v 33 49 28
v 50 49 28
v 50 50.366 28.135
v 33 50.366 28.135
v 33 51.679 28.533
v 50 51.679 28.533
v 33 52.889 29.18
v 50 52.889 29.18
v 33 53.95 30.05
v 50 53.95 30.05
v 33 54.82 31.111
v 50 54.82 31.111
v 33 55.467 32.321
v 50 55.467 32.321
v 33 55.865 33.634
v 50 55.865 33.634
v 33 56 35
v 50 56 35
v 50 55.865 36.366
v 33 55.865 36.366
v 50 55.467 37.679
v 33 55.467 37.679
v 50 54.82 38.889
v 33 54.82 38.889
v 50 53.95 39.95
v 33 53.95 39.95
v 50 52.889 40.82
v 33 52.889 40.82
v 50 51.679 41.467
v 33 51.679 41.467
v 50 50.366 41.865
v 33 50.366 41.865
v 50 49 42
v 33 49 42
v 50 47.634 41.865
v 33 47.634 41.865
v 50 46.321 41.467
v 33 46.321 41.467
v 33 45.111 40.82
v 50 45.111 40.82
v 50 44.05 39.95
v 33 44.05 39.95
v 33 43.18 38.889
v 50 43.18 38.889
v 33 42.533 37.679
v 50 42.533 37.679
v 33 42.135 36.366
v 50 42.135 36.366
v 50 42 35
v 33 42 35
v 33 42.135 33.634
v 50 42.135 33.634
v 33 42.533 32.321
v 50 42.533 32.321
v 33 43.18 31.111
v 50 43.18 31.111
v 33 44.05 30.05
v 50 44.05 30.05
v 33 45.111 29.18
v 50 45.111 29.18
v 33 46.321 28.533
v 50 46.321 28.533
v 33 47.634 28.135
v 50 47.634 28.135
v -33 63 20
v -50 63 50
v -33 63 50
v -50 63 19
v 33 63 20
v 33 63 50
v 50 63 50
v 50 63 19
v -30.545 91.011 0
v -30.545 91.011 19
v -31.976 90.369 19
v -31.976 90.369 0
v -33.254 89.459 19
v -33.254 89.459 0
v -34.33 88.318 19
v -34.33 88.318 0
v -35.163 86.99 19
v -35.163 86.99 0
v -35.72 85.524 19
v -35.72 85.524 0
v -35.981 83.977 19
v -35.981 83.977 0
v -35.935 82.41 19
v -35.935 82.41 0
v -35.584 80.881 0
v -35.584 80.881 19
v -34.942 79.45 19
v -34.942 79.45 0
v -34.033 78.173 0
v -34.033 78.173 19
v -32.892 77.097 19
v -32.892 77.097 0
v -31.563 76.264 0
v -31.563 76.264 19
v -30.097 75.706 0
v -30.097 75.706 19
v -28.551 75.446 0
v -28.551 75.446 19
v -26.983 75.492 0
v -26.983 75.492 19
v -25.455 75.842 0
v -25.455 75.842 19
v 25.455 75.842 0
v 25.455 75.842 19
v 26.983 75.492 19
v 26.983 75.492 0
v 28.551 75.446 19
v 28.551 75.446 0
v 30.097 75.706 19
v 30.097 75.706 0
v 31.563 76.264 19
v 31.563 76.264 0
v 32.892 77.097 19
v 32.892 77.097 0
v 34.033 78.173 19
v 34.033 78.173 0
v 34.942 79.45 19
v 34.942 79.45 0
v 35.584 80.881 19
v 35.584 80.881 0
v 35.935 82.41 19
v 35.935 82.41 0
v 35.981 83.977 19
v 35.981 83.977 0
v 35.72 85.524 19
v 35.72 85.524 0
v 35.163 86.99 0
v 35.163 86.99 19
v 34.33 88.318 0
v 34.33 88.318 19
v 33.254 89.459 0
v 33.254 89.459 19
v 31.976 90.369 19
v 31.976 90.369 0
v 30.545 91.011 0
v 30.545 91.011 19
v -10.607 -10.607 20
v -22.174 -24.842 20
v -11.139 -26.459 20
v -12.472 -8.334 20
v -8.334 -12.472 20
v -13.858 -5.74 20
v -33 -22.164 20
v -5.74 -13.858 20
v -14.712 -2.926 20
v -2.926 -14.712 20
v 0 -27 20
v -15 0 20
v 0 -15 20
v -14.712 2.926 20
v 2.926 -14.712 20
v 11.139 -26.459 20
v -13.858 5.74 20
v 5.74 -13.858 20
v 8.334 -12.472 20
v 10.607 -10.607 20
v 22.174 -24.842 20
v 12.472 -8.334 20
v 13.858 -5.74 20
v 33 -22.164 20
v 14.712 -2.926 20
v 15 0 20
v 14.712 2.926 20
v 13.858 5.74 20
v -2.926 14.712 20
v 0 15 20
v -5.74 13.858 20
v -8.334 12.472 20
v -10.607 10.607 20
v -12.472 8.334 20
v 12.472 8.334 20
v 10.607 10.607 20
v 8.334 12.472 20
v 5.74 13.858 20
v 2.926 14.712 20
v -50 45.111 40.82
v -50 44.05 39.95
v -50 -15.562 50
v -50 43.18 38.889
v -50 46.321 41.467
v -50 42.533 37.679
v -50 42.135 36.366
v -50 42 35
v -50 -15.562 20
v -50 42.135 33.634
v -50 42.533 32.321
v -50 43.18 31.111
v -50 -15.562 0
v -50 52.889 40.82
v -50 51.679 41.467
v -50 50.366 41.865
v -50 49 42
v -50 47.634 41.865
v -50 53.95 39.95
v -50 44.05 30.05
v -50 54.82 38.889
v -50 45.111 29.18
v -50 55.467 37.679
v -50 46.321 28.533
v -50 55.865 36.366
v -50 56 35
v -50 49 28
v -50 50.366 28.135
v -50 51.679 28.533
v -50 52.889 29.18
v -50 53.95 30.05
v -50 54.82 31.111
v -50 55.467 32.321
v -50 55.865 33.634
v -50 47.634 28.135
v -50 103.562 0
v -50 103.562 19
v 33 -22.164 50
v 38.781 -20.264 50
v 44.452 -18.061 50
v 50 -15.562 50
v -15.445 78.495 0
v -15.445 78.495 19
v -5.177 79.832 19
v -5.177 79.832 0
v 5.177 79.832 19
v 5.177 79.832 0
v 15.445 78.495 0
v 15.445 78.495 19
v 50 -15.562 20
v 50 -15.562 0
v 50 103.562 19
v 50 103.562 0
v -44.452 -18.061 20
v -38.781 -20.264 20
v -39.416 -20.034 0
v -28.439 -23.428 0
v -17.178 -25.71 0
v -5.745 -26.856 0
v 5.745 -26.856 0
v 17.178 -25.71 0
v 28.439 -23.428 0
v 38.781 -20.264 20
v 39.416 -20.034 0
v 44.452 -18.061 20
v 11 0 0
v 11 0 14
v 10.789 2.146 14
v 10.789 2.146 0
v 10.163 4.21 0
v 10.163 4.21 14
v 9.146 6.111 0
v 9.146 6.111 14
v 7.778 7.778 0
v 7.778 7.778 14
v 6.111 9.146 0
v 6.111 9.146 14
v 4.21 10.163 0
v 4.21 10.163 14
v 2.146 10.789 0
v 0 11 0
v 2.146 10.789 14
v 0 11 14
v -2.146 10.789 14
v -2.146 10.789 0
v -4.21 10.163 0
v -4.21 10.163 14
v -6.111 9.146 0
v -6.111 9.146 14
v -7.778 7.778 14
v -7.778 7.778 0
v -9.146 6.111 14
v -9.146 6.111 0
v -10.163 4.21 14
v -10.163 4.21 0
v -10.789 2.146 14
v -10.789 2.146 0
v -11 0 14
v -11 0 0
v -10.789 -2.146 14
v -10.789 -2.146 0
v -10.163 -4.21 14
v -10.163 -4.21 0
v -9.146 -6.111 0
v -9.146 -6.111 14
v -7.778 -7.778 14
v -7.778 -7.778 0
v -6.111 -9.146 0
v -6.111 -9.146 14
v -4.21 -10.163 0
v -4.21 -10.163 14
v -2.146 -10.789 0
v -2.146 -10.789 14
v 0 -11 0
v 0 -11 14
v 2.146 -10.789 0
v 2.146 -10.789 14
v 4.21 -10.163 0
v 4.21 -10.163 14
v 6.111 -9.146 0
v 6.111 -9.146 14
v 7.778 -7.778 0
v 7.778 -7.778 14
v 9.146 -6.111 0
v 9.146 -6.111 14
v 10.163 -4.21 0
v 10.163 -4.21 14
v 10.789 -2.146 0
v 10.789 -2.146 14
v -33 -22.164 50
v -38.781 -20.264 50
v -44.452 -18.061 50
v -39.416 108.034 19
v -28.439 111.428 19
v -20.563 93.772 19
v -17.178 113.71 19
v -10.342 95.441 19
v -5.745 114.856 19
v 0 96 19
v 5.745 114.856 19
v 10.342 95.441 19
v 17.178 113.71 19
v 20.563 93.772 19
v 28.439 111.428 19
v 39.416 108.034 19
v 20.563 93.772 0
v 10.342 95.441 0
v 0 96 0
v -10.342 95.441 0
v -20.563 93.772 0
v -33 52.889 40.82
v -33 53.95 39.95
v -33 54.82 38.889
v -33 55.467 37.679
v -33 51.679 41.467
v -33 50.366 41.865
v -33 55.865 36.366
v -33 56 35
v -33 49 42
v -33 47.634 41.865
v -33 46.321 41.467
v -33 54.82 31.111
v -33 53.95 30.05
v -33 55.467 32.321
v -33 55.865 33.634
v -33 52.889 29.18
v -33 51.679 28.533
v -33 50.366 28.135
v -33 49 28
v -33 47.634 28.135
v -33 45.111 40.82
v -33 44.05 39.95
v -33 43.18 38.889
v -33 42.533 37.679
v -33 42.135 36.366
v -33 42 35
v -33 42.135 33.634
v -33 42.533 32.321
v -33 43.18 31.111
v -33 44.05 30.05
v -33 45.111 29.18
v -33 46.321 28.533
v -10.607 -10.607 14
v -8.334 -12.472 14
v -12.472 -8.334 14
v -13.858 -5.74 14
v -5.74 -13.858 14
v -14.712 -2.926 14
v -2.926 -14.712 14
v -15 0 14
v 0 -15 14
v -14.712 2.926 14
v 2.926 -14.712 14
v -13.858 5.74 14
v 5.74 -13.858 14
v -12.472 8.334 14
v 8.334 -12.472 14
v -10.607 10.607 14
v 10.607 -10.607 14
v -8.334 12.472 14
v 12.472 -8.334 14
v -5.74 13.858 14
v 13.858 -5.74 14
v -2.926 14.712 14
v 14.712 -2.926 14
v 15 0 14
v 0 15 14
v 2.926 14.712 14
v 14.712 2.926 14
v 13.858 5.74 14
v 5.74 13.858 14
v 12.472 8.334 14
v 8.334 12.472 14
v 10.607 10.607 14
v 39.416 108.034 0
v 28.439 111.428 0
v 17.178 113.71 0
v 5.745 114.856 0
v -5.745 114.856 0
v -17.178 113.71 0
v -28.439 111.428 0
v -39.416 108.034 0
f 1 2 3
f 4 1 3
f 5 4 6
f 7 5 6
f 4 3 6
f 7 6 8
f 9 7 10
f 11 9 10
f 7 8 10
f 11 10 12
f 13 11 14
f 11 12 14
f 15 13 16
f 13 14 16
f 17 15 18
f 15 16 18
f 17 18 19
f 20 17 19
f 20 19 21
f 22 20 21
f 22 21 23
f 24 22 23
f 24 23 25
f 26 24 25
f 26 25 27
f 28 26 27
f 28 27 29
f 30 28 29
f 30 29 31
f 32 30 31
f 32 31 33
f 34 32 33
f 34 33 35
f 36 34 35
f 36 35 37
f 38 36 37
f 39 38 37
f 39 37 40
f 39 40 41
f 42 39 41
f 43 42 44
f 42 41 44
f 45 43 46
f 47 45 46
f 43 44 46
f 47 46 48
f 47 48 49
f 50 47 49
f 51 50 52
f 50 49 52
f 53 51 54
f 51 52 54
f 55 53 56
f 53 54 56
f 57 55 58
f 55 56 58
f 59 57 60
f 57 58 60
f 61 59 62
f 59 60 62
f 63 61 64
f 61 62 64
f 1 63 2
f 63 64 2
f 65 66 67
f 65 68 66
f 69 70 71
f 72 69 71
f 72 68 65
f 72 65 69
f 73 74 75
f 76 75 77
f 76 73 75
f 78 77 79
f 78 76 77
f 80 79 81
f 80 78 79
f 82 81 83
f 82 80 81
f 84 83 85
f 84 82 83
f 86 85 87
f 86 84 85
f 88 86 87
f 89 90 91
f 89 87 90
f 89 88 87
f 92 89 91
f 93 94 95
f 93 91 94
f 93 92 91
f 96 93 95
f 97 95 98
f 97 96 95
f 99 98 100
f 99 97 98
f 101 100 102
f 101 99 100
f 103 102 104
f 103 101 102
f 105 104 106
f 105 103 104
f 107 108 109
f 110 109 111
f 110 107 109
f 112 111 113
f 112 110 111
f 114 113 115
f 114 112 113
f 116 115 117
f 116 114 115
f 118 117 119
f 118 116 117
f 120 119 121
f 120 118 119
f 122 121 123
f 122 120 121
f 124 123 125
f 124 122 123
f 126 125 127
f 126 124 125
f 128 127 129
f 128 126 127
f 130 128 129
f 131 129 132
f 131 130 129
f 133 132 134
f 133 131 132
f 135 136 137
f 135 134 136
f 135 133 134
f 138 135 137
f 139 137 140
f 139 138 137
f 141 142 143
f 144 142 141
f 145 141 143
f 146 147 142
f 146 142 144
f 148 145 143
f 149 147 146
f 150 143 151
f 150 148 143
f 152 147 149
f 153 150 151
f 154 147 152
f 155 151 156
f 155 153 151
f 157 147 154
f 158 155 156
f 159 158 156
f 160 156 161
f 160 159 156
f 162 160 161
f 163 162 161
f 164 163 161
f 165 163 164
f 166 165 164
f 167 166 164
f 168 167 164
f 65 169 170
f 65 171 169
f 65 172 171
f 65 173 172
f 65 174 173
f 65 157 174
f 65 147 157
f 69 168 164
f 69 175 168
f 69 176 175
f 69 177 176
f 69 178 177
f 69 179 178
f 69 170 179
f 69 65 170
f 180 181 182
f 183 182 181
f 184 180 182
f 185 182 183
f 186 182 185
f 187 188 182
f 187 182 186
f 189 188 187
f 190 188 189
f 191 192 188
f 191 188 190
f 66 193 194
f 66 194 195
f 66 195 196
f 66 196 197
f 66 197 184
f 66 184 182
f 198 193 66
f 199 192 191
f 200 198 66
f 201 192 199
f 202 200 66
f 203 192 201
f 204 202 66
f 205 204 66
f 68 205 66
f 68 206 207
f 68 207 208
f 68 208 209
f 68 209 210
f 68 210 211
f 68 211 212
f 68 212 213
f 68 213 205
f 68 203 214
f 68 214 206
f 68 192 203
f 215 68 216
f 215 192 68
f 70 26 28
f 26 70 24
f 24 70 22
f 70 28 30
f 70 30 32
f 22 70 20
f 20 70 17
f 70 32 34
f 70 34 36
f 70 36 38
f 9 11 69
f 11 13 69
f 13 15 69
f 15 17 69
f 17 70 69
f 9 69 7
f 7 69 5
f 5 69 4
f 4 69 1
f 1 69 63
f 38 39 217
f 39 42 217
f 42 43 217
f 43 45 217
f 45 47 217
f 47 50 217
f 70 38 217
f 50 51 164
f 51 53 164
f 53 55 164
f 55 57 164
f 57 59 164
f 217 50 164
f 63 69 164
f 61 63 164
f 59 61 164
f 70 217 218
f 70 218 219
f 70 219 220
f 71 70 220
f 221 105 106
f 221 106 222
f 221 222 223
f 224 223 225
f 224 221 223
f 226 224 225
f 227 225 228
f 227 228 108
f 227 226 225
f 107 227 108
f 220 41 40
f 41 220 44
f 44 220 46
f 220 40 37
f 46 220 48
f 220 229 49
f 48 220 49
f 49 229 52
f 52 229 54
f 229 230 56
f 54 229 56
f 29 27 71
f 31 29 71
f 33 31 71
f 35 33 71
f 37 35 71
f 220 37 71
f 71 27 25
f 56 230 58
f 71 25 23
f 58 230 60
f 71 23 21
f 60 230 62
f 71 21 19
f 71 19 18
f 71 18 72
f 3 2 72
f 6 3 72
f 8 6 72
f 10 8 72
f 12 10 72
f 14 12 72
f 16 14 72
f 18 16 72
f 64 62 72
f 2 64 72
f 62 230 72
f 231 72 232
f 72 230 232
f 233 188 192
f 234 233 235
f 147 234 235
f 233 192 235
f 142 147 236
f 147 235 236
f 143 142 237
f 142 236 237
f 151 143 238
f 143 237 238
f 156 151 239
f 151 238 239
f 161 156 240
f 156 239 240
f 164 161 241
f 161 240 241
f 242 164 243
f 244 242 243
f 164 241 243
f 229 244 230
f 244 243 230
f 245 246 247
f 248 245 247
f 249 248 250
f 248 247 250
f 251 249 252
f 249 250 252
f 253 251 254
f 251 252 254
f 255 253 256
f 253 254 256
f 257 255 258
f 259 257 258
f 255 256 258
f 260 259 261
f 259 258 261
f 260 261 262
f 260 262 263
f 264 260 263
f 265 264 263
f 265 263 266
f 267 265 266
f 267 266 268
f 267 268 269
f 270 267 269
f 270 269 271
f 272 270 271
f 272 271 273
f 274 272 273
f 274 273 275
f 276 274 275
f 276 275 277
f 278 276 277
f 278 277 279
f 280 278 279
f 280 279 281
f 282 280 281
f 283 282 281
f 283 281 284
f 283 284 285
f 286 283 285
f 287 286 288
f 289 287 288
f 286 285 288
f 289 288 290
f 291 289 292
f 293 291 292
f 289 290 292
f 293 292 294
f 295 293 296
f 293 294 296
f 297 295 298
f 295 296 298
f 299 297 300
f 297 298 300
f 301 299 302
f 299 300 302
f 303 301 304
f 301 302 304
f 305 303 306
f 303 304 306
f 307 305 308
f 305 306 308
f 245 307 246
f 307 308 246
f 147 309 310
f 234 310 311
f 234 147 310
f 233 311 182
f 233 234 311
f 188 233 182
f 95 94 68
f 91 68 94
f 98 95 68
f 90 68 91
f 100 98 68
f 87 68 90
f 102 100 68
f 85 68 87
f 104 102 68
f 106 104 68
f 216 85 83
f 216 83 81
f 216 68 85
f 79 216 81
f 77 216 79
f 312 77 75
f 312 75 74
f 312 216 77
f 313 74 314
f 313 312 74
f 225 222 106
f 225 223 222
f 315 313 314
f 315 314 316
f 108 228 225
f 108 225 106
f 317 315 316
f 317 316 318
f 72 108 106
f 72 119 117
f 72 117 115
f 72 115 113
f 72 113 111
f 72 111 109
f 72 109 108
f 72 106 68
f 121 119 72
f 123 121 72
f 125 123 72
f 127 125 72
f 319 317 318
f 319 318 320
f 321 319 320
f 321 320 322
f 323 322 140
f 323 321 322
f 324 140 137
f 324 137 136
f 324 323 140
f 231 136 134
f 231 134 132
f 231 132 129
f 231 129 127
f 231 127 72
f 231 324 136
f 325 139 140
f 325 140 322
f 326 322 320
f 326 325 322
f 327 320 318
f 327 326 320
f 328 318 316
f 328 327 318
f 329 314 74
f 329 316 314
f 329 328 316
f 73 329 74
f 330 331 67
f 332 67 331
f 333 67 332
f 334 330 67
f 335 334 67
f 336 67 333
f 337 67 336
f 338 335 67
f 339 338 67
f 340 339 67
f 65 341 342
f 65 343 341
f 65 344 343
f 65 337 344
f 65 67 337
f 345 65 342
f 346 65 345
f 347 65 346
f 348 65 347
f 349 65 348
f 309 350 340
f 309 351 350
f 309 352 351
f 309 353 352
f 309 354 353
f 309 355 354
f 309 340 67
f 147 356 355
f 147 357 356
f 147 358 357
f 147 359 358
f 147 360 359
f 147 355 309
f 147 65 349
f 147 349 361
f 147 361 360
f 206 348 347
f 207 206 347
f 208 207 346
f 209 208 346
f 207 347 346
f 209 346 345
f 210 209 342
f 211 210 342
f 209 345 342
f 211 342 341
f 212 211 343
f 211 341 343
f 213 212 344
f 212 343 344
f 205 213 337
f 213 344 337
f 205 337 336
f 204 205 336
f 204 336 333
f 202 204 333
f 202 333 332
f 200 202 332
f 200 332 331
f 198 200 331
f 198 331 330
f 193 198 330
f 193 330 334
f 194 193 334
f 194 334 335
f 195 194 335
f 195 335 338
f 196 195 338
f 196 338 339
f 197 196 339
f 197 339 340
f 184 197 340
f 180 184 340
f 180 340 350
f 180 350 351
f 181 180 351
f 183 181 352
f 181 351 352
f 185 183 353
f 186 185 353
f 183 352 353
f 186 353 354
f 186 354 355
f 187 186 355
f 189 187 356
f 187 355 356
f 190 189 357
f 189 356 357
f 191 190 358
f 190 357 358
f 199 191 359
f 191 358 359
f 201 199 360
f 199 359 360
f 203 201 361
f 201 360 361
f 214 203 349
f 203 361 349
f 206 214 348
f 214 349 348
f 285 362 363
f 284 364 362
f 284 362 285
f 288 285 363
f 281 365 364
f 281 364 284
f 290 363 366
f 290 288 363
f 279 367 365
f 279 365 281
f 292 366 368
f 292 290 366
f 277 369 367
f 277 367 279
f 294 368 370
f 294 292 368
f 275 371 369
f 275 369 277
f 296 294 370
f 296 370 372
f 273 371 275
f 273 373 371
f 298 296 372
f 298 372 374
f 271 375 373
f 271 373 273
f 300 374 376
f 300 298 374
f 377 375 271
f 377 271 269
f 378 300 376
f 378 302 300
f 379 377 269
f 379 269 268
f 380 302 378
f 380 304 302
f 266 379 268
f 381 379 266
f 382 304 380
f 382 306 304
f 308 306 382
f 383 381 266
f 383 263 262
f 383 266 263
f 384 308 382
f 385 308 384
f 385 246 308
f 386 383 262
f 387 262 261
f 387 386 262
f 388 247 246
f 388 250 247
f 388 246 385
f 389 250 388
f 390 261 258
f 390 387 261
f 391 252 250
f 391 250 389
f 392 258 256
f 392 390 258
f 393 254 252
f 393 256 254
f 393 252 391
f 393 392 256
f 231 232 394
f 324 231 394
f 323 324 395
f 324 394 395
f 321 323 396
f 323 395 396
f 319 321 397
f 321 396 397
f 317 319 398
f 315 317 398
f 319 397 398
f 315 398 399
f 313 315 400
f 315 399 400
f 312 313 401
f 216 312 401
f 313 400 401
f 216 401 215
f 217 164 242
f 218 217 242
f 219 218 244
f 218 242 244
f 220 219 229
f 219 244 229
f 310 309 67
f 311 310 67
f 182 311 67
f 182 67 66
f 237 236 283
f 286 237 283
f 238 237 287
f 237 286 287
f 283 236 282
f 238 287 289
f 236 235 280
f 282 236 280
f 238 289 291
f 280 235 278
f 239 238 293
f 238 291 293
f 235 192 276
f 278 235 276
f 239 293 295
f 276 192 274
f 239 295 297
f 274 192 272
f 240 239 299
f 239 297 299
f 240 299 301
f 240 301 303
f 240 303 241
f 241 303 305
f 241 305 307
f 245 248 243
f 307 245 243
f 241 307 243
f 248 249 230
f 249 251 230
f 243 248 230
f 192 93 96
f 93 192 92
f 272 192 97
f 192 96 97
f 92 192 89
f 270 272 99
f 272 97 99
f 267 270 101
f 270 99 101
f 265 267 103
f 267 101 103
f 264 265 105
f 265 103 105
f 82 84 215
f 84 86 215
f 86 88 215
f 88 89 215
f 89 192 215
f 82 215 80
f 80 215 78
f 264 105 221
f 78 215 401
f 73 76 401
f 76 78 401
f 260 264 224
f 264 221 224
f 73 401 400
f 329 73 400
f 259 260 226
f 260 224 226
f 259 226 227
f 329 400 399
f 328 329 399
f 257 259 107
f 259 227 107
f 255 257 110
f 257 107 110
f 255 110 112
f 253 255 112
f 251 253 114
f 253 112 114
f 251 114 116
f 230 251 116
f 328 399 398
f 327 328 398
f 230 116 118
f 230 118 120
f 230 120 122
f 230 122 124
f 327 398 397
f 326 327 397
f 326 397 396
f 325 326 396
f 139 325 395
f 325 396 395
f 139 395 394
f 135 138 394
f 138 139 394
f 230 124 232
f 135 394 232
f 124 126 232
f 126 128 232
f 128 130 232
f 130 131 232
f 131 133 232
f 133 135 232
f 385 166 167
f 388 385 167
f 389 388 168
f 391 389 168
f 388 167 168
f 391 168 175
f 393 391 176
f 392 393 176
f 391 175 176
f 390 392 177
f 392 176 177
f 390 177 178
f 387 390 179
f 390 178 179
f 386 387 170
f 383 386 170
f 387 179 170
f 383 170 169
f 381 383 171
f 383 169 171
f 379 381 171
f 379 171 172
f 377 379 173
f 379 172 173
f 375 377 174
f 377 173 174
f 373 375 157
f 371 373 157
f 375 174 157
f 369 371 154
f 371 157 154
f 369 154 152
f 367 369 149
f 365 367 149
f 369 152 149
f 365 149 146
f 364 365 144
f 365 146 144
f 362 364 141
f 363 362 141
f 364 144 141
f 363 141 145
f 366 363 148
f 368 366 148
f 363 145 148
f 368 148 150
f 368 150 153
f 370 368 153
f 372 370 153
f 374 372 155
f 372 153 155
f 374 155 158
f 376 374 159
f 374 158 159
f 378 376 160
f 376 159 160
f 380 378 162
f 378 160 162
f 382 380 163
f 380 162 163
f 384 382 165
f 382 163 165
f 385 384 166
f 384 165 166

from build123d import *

# Parameters (mm, degrees)
BOSS_EXTRUDE1_DEPTH = 20
BOSS_EXTRUDE2_DEPTH = 30
CUT_EXTRUDE1_DEPTH  = 1
SKETCH8_R           = 15
CUT_EXTRUDE2_DEPTH  = 6
SKETCH9_R           = 11
CUT_EXTRUDE3_DEPTH  = 15
SKETCH10_R          = 7
CUT_EXTRUDE4_DEPTH  = 101


with BuildPart() as part:
    # Sketch3 → Boss-Extrude1 (new body)
    with BuildSketch(Plane.XY):
        with BuildLine():
            Line((-50, 103.561575886), (-50, -15.561575886))
            ThreePointArc((-50, -15.561575886), (0, -27), (50, -15.561575886))
            Line((50, -15.561575886), (50, 103.561575886))
            ThreePointArc((50, 103.561575886), (0, 115), (-50, 103.561575886))
        make_face()
        with BuildLine():
            ThreePointArc((30.545454545, 91.010852136), (0, 96), (-30.545454545, 91.010852136))
            ThreePointArc((-30.545454545, 91.010852136), (-35.584237678, 80.881159913), (-25.454545455, 75.84237678))
            ThreePointArc((-25.454545455, 75.84237678), (0, 80), (25.454545455, 75.84237678))
            ThreePointArc((25.454545455, 75.84237678), (35.584237678, 80.881159913), (30.545454545, 91.010852136))
        make_face(mode=Mode.SUBTRACT)
    extrude(amount=BOSS_EXTRUDE1_DEPTH)

    # Sketch5 → Boss-Extrude2 (add)
    with BuildSketch(Plane.XY.offset(20)):
        with BuildLine():
            Line((-50, 63), (-33, 63))
            Line((-33, 63), (-33, -22.163514831))
            ThreePointArc((-33, -22.163514831), (-41.631074926, -19.200063435), (-50, -15.561575886))
            Line((-50, -15.561575886), (-50, 63))
        make_face()
        with BuildLine():
            Line((50, -15.561575886), (50, 63))
            Line((50, 63), (33, 63))
            Line((33, 63), (33, -22.163514831))
            ThreePointArc((33, -22.163514831), (41.631074926, -19.200063435), (50, -15.561575886))
        make_face()
    extrude(amount=BOSS_EXTRUDE2_DEPTH)

    # Sketch6 → Cut-Extrude1 (cut)
    with BuildSketch(Plane.XY.offset(20)):
        with BuildLine():
            Line((-33, 63), (33, 63))
            Line((33, 63), (50, 63))
            Line((50, 63), (50, 103.561575886))
            ThreePointArc((50, 103.561575886), (0, 115), (-50, 103.561575886))
            Line((-50, 103.561575886), (-50, 63))
            Line((-50, 63), (-33, 63))
        make_face()
    extrude(amount=-CUT_EXTRUDE1_DEPTH, mode=Mode.SUBTRACT)

    # Sketch8 → Cut-Extrude2 (cut)
    with BuildSketch(Plane.XY.offset(20)):
        Circle(SKETCH8_R)
    extrude(amount=-CUT_EXTRUDE2_DEPTH, mode=Mode.SUBTRACT)

    # Sketch9 → Cut-Extrude3 (cut, through all)
    with BuildSketch(Plane.XY.offset(14)):
        Circle(SKETCH9_R)
    extrude(amount=-CUT_EXTRUDE3_DEPTH, mode=Mode.SUBTRACT)

    # Sketch10 → Cut-Extrude4 (cut, through all)
    with BuildSketch(Plane(origin=(50, 0, 0), x_dir=(0, 0, -1), z_dir=(1, 0, 0))):
        with Locations((-35, 49)):
            Circle(SKETCH10_R)
    extrude(amount=-CUT_EXTRUDE4_DEPTH, mode=Mode.SUBTRACT)


solid = part.part
